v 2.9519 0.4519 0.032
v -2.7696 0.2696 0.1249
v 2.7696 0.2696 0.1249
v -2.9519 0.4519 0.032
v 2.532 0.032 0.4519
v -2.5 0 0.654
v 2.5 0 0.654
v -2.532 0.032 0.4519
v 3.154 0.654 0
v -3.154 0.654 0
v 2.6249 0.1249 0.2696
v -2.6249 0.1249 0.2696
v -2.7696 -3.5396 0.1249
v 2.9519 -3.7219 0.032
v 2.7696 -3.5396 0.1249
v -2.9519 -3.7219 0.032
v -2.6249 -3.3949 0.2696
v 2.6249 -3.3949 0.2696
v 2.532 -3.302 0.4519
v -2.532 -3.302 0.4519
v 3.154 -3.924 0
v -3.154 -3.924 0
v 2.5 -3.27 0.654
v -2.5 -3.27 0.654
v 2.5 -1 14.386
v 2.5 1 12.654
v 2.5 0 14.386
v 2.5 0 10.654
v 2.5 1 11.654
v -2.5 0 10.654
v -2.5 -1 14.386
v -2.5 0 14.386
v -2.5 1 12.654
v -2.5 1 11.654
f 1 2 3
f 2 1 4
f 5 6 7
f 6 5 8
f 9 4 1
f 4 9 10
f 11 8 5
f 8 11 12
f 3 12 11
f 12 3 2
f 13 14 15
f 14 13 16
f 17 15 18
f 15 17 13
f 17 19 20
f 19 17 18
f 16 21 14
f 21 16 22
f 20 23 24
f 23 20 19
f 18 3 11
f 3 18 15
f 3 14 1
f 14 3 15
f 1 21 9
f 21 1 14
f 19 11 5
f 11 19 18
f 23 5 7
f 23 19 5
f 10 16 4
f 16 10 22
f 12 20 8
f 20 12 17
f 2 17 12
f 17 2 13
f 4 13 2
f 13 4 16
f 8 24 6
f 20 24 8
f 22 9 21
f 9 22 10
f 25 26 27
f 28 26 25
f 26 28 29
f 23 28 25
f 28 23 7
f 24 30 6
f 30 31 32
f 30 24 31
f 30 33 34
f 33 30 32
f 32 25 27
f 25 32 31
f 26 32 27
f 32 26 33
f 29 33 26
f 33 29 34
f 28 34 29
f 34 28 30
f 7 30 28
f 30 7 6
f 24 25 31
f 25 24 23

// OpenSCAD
// file: mirror_copy.scad
module mirror_copy(vector=[1,0,0]){
    children();
    mirror(vector) children();
}
// main file
use<mirror_copy.scad>

//********************* variables ***********************
/*
eps=0.5*6/100;//Elongation at break of PLA=6%
Epm=0.06;   //max permissible strain
SF=2;       //safety factor
t=1.5;  //wallyhickness
l=10;  //arm length(x)
w=5;    //arm width
f=1;    //factor
help=false; //help message
angle=30;   //taper angle
y=1;
E=Epm/SF;   //design strain
*/
//********************* calculated variables ***********************

//root=h(E,l,y);
//fillet=max(root/5,0.4);

//********************* functions ***********************

//finger(l,root,y,xland,angle,yland)
//creates a path for the shape of the finger
function finger(l,root,y,xLand,angle,yLand)=
    [[0,0],[l,0],[l+y,y],
    [l+y+xLand,y],[l+y+xLand+y/tan(angle),0],
    [l+y+xLand+y/tan(angle),-yLand],[0,-root]];
//calculates the root thickness required(h)
function h(E,l,y)=1.09*E*pow(l,2)/y;

//Example:
hook();

module hook(
eps=0.5*6/100,//Elongation at break of PLA=6%
Epm=0.06,   //max permissible strain
SF=2,       //safety factor
t=1.5,  //wallyhickness
l=10,  //arm length(x)
w=5,    //arm width
f=1,    //factor
help=false, //help message
angle=30,   //taper angle
y=1
){
    E=Epm/SF;   //design strain
    root=h(E,l,y);
    fillet=max(root/5,0.4);
    //********************* construct finger **************************  
    translate([w/2,0,fillet])rotate([0,-90,0])
    linear_extrude(w)polygon(finger(l,root,y,xLand=1,angle=30,yLand=1));
    translate([0,-root/2,0])
    difference(){
        translate([0,0,fillet/2])
        cube([w+2*fillet,root+2*fillet,fillet],center=true); //base
        mirror_copy([0,1,0])translate([0,root/2+fillet,fillet])
        rotate([0,90,0])cylinder(h=w+2*fillet,r=fillet,$fn=20,center=true);
        mirror_copy([1,0,0])translate([w/2+fillet,0,fillet])
        rotate([90,0,0])cylinder(h=root+2*fillet,r=fillet,$fn=20,
        center=true);
    }
}
